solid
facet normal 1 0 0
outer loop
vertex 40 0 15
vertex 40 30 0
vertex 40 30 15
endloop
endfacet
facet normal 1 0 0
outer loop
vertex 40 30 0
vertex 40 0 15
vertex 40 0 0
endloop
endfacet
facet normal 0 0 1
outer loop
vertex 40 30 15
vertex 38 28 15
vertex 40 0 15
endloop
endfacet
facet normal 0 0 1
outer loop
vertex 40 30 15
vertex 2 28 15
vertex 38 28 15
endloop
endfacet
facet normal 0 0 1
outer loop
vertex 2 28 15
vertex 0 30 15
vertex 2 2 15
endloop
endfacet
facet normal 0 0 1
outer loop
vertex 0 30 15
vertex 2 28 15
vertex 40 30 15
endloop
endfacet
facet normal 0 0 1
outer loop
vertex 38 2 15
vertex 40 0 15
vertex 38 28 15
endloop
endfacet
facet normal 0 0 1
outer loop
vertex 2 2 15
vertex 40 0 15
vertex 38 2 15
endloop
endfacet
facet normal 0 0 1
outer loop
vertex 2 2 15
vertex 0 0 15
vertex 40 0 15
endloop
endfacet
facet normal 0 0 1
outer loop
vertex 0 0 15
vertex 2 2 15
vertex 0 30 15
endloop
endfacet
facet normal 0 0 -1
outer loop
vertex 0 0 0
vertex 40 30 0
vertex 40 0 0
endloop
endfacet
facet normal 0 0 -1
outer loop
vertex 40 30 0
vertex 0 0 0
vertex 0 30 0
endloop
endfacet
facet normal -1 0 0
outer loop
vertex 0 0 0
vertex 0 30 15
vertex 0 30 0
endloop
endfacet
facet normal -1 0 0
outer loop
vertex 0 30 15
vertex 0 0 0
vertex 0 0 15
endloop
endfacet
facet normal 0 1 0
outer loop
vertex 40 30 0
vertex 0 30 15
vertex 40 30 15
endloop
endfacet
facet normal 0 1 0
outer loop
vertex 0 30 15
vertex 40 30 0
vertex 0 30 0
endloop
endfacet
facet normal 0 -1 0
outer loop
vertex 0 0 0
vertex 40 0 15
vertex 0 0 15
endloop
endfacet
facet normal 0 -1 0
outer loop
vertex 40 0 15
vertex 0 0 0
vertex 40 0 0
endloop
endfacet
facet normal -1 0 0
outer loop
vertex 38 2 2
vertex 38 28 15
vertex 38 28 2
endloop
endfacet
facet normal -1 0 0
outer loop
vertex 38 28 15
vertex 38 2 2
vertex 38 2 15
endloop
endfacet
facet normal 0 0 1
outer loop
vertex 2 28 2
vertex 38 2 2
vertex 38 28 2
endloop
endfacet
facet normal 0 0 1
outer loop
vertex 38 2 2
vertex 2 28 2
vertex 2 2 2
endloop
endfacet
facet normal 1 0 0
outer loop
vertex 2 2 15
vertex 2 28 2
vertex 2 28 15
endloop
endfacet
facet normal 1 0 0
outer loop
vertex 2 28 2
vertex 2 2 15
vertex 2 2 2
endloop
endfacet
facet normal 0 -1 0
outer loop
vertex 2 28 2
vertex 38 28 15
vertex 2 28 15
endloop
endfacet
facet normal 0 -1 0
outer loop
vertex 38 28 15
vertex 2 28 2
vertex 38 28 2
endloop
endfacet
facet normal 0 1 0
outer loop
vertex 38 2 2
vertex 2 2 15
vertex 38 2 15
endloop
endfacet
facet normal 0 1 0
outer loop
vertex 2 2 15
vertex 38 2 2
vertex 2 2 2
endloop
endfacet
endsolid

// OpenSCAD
// Forca test fixture: a small parametric box with every kind of Customizer parameter.

/* [Size] */
// Outside width
width = 40; // [10:0.5:100]
// Outside depth
depth = 30; // [10:1:100]
height = 15;

/* [Style] */
// Round the corners
rounded = true;
// Which part to render
part = "box"; // [box:Box, lid:Lid]
// Text on the lid ("quotes" and \ backslash)
label = "Forca";
// Lid size, width and depth
lid_size = [40, 30];

/* [Hidden] */
wall = 2;

module body() {
    difference() {
        cube([width, depth, height]);
        translate([wall, wall, wall]) cube([width - 2 * wall, depth - 2 * wall, height]);
    }
}

if (part == "box")
    color("#3D6B9C") body();
else
    color("#2B2B2B") cube([lid_size[0], lid_size[1], wall]);
